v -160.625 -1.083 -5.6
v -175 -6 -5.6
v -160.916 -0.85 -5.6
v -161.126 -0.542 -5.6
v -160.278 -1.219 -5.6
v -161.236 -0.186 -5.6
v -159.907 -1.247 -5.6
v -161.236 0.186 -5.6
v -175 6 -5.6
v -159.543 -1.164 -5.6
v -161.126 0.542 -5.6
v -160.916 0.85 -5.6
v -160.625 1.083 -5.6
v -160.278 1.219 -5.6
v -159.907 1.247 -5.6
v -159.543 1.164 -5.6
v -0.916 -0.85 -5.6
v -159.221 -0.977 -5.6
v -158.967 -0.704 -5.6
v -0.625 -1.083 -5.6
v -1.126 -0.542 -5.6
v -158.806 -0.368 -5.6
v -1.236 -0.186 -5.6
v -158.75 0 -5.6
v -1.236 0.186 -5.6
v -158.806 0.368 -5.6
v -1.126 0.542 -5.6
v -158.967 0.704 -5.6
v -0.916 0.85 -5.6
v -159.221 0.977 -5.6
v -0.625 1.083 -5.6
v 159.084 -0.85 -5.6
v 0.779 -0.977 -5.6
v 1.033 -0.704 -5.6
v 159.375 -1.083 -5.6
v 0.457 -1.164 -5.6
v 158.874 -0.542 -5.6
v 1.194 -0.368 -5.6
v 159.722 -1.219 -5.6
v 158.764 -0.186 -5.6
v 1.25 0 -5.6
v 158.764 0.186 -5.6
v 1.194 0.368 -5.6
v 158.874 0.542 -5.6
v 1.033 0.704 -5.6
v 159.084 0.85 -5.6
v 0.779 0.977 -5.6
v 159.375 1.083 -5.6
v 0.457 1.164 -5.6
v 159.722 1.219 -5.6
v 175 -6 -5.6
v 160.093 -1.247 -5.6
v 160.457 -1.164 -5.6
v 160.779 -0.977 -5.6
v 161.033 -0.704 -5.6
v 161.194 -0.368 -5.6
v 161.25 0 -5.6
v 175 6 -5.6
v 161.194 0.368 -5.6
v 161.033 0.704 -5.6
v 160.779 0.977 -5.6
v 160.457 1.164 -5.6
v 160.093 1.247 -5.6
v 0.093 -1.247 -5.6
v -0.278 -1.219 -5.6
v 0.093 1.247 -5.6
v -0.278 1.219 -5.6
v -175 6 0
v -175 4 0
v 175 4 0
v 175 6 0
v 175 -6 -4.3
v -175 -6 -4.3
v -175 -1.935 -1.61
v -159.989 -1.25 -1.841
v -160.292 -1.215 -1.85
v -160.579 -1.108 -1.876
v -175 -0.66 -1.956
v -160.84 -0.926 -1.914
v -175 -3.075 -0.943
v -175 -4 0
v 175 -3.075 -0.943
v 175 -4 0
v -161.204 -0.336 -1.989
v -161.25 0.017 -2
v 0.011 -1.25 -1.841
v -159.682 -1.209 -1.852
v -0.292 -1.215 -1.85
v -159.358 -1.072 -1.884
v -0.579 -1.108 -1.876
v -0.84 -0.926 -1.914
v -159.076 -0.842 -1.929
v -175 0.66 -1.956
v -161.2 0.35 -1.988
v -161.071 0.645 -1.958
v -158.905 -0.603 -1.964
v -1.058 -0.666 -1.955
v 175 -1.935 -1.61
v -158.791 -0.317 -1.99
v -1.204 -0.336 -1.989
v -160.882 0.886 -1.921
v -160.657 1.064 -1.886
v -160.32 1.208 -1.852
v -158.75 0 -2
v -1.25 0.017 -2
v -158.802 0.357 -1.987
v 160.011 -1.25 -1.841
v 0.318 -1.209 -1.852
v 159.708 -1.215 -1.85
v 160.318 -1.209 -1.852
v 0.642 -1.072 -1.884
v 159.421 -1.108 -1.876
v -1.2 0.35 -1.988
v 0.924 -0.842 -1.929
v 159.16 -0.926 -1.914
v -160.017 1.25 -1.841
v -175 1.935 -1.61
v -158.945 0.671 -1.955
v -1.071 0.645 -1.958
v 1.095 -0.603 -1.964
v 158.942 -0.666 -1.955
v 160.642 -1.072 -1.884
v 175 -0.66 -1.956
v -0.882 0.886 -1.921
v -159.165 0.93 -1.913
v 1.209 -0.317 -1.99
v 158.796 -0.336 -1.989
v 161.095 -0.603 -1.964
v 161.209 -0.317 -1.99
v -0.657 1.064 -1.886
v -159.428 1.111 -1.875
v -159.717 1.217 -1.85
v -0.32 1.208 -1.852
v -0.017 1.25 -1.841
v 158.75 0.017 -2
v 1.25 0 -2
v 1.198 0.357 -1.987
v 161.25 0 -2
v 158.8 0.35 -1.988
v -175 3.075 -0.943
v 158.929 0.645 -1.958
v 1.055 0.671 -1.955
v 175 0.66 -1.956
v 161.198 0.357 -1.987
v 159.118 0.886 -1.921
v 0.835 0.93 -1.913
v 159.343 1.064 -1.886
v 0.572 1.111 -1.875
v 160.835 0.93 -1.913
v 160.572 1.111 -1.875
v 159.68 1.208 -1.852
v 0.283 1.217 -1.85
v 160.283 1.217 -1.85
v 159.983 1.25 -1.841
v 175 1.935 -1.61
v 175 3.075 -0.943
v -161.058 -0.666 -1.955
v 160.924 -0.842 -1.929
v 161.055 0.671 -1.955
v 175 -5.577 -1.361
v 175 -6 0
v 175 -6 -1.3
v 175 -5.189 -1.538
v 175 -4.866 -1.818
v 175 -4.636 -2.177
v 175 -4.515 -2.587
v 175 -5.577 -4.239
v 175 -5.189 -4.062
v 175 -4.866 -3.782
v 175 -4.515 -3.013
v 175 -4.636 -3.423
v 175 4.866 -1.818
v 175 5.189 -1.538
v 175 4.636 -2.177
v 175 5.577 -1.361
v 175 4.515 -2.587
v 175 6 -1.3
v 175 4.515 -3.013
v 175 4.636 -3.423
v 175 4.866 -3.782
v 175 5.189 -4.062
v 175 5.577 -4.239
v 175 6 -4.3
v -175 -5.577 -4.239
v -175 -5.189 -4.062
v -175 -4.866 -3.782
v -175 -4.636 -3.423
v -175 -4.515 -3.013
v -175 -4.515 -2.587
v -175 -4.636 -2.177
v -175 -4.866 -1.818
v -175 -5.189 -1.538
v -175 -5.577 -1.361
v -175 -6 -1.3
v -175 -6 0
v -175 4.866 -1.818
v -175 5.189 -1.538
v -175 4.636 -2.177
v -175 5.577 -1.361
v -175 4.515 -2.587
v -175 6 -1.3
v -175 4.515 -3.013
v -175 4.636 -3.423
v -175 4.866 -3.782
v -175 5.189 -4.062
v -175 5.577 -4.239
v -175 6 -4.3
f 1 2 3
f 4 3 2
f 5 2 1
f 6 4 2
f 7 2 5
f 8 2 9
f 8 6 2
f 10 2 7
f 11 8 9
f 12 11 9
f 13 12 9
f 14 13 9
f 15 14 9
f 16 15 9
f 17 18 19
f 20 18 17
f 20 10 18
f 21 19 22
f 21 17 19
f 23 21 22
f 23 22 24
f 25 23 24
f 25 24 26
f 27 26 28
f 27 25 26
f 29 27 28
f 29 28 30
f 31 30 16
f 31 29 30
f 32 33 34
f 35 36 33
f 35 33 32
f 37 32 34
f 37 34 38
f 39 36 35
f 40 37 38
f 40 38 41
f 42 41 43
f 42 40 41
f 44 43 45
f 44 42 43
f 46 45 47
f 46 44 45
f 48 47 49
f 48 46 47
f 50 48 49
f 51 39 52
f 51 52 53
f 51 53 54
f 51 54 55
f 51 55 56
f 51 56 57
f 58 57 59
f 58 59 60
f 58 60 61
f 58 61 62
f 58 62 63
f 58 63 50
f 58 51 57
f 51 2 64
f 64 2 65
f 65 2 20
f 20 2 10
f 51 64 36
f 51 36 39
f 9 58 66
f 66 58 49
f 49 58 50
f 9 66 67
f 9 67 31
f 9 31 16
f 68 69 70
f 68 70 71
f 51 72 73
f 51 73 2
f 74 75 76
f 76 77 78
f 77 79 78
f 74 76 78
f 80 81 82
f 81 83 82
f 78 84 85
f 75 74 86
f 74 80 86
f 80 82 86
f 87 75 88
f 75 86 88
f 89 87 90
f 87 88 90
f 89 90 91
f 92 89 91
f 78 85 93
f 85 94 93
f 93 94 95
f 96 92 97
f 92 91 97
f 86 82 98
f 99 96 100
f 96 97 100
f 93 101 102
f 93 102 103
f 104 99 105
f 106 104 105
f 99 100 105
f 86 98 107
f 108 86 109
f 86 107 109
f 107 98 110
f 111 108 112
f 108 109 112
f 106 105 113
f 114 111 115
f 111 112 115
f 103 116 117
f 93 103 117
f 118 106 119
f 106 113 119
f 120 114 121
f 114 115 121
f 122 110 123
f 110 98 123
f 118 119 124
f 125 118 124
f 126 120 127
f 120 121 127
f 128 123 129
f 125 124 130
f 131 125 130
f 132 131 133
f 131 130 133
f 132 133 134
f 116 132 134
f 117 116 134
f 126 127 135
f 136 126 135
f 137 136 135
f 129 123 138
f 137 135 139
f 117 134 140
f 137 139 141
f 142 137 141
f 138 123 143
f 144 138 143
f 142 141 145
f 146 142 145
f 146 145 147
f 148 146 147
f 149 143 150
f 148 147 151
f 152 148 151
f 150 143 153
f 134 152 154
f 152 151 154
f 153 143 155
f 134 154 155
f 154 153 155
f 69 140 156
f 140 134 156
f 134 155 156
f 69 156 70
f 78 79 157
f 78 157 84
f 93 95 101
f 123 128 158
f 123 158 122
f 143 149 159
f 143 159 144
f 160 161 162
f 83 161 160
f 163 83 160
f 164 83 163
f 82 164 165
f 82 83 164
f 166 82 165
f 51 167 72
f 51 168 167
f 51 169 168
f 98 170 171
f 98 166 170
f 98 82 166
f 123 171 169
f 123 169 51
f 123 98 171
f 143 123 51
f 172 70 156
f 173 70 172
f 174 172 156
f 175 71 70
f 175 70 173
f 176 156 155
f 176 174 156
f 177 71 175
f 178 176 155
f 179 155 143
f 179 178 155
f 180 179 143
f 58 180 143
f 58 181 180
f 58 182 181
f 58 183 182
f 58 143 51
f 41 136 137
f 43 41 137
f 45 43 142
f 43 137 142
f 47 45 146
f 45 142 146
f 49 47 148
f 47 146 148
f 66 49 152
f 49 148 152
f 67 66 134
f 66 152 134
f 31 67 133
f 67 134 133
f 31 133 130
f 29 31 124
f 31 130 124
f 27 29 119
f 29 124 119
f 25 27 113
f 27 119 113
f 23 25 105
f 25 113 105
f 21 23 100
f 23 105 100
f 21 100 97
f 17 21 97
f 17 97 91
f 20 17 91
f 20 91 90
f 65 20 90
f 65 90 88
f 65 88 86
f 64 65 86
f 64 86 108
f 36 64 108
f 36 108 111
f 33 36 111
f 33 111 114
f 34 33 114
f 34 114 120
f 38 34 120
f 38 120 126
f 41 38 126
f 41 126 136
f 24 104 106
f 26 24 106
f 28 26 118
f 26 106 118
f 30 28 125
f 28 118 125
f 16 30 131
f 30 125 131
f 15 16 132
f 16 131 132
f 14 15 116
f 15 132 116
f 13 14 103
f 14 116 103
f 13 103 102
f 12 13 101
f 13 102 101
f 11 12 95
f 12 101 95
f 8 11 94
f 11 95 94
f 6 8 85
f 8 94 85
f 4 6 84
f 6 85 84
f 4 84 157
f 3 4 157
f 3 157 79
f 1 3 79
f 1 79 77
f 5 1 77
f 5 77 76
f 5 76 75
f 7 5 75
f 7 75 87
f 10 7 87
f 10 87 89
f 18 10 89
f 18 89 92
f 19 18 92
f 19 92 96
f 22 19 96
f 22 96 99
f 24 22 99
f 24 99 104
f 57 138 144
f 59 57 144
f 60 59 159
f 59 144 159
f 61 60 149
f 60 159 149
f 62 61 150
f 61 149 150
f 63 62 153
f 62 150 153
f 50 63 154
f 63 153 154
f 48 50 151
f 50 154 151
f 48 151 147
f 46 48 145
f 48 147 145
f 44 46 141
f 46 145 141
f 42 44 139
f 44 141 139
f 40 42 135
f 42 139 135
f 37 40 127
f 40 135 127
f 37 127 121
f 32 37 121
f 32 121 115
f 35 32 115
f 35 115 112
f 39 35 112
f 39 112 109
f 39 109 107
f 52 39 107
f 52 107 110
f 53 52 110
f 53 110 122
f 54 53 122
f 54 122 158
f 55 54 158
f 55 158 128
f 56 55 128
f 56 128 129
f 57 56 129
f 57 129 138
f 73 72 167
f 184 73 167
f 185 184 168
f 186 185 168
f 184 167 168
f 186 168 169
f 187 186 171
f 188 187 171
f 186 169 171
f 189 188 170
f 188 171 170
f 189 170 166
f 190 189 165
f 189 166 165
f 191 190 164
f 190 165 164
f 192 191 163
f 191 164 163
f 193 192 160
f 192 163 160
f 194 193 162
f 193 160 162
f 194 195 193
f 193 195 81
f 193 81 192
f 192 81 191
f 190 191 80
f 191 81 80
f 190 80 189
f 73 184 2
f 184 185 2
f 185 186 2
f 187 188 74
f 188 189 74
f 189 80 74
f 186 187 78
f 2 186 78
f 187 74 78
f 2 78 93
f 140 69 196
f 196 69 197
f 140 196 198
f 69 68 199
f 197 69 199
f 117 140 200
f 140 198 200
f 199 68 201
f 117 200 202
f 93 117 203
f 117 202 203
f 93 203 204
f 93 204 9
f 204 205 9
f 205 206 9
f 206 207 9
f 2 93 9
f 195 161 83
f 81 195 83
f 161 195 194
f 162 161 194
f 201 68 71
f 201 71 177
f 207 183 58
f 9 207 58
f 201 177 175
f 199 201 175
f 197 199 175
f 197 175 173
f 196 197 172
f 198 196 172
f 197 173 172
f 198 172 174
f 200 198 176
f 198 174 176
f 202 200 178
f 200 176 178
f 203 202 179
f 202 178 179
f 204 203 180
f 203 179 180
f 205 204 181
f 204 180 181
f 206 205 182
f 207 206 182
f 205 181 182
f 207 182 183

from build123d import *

# Parameters (mm, degrees)
SKETCH_1_W             = 5.6
SKETCH_1_H             = 12
EXTRUDE_1_DEPTH        = 175
SKETCH_2_R             = 1.5
CUT_EXTRUDE_1_DEPTH    = 350
SKETCH_3_R             = 5
CUT_EXTRUDE_2_DEPTH    = 350
HOLE_WIZARD_M3_1_D     = 2.5
PATTERN_LINEAR_2_COUNT = 3
PATTERN_LINEAR_2_PITCH = 160


with BuildPart() as part:
    # 草图1 → 凸台-拉伸1 (new, symmetric)
    with BuildSketch(Plane(origin=(0, 0, 0), x_dir=(0, 0, -1), z_dir=(1, 0, 0))):
        with Locations((2.8, 0)):
            Rectangle(SKETCH_1_W, SKETCH_1_H)
    extrude(amount=EXTRUDE_1_DEPTH, both=True)

    # 草图2 → 切除-拉伸1 (cut)
    with BuildSketch(Plane(origin=(175, 0, 0), x_dir=(0, 0, -1), z_dir=(1, 0, 0))):
        with Locations((2.8, 6)):
            Circle(SKETCH_2_R)
        with Locations((2.8, -6)):
            Circle(SKETCH_2_R)
    extrude(amount=-CUT_EXTRUDE_1_DEPTH, mode=Mode.SUBTRACT)

    # 草图3 → 切除-拉伸2 (cut)
    with BuildSketch(Plane(origin=(175, 0, 0), x_dir=(0, 0, -1), z_dir=(1, 0, 0))):
        with Locations((-3, 0)):
            Circle(SKETCH_3_R)
    extrude(amount=-CUT_EXTRUDE_2_DEPTH, mode=Mode.SUBTRACT)

    # M3 螺纹孔1 (through all)
    with Locations(Plane(origin=(0, 0, -5.6), x_dir=(-1, 0, 0), z_dir=(0, 0, -1))):
        with Locations((-160, 0)):
            hole_wizard_m3_1 = Hole(HOLE_WIZARD_M3_1_D / 2)

    # 阵列(线性)2: M3 螺纹孔1 ×3
    with Locations(*[(-i * PATTERN_LINEAR_2_PITCH, 0, 0) for i in range(1, PATTERN_LINEAR_2_COUNT)]):
        add(hole_wizard_m3_1, mode=Mode.SUBTRACT)


solid = part.part
